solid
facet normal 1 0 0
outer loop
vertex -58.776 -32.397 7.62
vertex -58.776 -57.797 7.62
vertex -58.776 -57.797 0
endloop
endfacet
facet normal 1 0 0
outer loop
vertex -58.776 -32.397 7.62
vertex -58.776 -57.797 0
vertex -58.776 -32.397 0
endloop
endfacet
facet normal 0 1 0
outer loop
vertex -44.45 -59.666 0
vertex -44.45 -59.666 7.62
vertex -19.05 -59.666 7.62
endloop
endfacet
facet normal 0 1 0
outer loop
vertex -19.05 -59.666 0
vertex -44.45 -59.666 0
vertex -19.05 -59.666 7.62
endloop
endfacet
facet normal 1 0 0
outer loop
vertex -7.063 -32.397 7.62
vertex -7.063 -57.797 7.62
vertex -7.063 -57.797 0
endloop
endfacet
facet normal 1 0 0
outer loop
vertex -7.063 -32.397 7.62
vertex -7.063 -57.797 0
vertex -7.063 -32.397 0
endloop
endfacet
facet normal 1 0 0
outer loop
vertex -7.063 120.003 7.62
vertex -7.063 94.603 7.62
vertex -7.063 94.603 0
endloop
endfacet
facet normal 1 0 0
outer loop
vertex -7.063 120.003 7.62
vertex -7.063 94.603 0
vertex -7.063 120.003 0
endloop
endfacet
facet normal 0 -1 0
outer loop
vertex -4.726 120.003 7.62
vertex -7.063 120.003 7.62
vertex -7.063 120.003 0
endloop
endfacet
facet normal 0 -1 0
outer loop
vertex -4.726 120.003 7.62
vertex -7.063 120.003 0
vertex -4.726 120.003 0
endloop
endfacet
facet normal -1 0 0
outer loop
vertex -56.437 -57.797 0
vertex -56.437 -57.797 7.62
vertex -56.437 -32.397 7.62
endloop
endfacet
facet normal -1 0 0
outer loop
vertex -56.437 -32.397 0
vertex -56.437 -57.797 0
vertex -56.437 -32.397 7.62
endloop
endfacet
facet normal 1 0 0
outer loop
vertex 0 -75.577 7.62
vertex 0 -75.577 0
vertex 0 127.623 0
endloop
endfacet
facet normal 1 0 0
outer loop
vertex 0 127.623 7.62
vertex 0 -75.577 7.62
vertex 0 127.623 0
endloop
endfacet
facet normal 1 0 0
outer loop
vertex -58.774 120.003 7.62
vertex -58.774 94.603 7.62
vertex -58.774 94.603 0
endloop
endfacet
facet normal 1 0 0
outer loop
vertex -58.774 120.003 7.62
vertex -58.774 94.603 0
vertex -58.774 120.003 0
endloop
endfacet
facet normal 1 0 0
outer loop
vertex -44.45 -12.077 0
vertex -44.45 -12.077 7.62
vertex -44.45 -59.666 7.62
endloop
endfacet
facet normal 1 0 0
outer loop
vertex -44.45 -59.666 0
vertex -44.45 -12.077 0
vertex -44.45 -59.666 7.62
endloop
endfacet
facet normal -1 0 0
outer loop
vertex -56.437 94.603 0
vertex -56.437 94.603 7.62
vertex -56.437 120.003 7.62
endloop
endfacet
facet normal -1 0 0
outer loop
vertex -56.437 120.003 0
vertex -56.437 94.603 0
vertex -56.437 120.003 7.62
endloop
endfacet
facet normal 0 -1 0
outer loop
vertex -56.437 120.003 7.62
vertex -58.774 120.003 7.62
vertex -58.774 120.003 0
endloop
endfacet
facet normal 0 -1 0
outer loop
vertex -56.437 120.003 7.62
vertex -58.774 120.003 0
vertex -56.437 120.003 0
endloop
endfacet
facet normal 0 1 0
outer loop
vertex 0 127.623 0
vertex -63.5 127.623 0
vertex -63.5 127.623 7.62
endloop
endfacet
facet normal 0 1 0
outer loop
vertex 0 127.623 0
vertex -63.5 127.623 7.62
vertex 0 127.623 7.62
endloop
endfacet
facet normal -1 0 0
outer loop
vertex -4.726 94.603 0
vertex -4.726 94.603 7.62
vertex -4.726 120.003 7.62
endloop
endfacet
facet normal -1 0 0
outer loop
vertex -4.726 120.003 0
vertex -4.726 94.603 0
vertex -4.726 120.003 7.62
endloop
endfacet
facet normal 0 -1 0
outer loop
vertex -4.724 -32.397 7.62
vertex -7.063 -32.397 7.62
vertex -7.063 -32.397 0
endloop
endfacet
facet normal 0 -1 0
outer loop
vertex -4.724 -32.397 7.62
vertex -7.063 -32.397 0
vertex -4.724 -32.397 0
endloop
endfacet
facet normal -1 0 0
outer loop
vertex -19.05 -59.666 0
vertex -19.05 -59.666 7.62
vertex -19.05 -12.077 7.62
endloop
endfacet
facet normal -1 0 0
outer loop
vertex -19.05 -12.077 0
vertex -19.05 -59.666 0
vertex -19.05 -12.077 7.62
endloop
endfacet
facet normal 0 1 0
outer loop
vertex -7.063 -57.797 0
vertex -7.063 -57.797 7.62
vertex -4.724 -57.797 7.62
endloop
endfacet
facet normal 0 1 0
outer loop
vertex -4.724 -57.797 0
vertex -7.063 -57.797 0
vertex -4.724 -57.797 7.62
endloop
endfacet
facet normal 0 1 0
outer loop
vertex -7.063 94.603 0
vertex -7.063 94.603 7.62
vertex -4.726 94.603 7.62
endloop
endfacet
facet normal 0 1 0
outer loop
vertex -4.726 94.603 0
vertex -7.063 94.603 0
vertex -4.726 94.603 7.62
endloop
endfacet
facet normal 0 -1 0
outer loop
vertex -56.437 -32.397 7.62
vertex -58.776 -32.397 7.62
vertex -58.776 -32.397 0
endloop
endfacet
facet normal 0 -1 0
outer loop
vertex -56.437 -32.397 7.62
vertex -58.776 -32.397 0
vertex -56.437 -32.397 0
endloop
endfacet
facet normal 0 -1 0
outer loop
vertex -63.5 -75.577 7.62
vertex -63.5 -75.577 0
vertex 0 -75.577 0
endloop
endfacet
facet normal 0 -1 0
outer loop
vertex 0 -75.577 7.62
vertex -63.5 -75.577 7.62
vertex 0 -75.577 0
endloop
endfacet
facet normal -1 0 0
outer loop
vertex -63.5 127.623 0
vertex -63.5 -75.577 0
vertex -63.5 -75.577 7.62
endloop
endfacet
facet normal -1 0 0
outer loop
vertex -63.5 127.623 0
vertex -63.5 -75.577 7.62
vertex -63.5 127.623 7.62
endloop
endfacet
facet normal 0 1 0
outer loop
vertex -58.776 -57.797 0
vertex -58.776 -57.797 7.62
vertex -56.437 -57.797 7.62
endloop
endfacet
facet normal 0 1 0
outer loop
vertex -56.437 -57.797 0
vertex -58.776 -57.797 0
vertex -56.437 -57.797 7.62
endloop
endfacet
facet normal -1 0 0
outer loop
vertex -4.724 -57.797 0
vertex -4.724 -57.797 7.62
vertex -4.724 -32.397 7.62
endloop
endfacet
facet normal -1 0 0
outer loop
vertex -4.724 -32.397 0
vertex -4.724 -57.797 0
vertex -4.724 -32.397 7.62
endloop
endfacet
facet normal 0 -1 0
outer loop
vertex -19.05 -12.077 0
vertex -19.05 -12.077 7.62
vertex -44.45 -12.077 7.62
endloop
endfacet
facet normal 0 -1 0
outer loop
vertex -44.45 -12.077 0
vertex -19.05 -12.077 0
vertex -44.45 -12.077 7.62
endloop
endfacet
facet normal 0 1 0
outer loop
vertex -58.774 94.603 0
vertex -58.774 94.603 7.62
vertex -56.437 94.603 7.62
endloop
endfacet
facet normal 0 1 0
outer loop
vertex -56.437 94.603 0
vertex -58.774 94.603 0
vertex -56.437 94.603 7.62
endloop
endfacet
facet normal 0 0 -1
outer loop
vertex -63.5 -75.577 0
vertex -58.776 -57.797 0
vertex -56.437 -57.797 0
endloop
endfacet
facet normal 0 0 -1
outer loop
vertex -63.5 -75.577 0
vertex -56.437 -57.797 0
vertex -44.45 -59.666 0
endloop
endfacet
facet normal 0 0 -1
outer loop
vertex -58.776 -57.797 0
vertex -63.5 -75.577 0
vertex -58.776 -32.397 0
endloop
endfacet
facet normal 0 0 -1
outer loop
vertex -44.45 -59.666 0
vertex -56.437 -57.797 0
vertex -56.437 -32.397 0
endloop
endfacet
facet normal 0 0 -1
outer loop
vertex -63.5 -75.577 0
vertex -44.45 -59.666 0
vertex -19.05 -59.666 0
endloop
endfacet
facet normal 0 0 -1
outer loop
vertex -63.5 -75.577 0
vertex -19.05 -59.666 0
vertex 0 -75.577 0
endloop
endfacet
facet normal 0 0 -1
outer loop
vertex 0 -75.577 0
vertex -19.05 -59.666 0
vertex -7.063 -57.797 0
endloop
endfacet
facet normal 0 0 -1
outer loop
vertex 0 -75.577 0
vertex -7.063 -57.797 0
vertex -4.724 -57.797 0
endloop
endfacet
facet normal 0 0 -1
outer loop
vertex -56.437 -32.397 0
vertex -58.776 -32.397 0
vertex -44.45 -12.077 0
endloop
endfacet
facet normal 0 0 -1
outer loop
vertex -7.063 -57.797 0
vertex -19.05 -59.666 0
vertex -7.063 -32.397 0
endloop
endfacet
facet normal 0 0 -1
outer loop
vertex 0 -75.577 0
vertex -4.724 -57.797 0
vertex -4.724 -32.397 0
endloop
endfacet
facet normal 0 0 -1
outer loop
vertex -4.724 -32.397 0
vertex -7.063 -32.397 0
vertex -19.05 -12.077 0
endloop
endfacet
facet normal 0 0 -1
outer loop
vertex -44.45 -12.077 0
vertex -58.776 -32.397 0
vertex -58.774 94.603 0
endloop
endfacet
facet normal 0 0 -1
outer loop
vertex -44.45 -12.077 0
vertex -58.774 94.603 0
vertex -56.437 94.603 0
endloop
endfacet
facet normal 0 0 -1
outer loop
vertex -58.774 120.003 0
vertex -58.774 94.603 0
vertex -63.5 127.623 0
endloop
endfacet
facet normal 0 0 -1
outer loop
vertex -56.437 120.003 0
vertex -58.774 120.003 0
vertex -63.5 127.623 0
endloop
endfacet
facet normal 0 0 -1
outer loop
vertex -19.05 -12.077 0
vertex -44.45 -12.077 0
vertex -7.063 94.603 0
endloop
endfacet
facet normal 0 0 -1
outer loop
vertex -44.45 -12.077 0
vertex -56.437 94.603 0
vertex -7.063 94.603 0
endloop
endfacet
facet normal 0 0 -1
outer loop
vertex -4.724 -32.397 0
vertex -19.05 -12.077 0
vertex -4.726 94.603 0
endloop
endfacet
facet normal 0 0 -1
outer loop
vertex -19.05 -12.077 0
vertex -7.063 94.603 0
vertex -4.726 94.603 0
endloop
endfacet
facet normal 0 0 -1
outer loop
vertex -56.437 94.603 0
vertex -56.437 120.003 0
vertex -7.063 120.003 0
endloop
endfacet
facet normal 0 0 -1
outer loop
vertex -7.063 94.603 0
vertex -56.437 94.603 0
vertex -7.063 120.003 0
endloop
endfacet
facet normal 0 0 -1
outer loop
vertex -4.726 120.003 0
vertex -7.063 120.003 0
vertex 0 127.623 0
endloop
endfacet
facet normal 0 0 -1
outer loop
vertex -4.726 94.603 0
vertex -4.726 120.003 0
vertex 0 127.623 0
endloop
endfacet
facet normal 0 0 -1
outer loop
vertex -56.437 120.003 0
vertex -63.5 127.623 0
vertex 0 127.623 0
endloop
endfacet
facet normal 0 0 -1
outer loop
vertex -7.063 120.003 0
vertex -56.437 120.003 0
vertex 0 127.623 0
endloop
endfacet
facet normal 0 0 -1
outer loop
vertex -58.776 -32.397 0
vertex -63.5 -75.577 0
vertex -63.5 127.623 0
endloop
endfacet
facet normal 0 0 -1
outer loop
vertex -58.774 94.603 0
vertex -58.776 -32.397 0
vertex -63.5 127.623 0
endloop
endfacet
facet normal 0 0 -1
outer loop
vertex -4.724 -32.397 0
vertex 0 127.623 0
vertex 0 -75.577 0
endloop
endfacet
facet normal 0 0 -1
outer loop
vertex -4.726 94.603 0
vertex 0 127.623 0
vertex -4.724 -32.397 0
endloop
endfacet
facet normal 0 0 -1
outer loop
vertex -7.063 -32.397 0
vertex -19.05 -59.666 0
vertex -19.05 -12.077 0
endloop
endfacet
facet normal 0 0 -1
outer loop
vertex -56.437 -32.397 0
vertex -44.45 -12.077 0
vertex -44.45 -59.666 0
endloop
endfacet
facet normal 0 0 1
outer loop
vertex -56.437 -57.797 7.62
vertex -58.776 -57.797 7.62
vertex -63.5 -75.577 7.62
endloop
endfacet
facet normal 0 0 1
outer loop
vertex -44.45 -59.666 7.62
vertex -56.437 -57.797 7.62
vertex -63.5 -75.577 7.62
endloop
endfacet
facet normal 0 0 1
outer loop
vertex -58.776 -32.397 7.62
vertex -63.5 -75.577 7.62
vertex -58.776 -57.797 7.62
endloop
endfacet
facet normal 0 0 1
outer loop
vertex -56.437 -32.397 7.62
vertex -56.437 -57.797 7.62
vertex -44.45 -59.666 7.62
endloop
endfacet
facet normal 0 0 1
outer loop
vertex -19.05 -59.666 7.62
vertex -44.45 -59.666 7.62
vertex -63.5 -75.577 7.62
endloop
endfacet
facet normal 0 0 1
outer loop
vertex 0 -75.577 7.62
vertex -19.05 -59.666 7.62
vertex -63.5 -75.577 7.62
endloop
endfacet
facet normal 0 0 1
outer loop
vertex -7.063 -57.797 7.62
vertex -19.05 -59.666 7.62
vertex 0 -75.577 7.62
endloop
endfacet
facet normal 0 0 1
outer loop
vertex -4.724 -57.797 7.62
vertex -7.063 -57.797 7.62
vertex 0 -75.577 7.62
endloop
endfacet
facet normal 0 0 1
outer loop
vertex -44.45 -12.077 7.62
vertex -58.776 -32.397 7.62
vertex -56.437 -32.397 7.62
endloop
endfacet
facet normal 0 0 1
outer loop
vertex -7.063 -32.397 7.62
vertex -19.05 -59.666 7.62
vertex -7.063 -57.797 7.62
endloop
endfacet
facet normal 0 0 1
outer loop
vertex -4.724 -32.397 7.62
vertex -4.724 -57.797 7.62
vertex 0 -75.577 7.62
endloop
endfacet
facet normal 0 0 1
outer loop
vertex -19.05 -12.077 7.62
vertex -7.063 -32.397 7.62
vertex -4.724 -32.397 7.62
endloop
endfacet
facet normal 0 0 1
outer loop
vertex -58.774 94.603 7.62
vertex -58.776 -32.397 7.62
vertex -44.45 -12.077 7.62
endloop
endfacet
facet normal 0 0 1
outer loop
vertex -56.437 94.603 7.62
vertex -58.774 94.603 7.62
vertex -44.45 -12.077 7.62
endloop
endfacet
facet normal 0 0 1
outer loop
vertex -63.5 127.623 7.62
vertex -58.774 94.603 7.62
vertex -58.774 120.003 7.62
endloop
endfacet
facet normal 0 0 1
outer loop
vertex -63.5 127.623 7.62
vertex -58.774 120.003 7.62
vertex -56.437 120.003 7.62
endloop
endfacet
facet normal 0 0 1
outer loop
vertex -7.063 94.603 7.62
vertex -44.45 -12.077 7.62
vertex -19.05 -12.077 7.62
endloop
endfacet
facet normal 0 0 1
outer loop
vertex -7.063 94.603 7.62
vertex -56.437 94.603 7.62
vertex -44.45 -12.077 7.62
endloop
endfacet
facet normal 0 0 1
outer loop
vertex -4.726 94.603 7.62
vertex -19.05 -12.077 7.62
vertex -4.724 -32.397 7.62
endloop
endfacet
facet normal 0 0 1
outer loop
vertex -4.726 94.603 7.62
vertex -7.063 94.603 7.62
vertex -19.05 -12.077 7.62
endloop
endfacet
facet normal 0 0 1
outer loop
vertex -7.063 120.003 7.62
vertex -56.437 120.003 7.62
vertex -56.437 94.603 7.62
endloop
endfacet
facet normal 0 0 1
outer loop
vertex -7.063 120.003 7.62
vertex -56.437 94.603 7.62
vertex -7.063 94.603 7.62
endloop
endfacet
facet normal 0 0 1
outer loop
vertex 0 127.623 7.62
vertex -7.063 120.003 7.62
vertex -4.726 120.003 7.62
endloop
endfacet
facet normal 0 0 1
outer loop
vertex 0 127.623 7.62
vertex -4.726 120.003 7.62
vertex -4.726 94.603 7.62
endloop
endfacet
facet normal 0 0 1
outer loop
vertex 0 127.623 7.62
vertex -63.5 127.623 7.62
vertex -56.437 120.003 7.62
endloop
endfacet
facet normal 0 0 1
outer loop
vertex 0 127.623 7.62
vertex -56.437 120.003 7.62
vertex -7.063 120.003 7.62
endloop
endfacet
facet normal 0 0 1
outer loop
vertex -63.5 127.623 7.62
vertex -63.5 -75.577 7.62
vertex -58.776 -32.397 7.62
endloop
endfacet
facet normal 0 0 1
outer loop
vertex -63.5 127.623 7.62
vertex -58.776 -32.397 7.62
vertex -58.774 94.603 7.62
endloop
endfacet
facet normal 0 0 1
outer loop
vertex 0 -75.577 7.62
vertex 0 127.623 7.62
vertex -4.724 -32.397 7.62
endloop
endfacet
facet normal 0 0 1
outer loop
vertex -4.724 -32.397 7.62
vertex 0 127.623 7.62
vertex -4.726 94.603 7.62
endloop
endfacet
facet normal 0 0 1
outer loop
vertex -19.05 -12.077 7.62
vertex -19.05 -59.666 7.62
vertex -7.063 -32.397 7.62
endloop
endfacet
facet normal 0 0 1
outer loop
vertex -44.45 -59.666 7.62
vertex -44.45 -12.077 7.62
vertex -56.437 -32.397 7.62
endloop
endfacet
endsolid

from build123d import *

# Parameters (mm, degrees)
F0_W     = 63.5
F0_H     = 203.2
F1_DEPTH = 7.62
F3_DEPTH = 12.7
F4_W     = 2.3368
F4_H     = 25.4
F4_W_2   = 2.338178
F5_DEPTH = 25.4


with BuildPart() as f1:
    # F0 (on Top) → F1 (new body)
    with BuildSketch(Plane.XY):
        with Locations((-31.75, 26.023151)):
            Rectangle(F0_W, F0_H)
    extrude(amount=F1_DEPTH)

    # F2 (on face) → F3 (cut)
    with BuildSketch(Plane.XY.offset(7.62)):
        Polygon((-19.05, -59.665699), (-19.05, -12.076849), (-31.75, -12.076849), (-44.45, -12.076849), (-44.45, -59.665699), align=None)
    extrude(amount=-F3_DEPTH, mode=Mode.SUBTRACT)

    # F4 (on face) → F5 (cut)
    with BuildSketch(Plane.XY.offset(7.62)):
        with Locations((-57.605822, 107.303151)):
            Rectangle(F4_W, F4_H)
        with Locations((-57.606511, -45.096849)):
            Rectangle(F4_W_2, F4_H)
        with Locations((-5.894178, 107.303151)):
            Rectangle(F4_W, F4_H)
        with Locations((-5.893489, -45.096849)):
            Rectangle(F4_W_2, F4_H)
    extrude(amount=-F5_DEPTH, mode=Mode.SUBTRACT)


solid = f1.part
